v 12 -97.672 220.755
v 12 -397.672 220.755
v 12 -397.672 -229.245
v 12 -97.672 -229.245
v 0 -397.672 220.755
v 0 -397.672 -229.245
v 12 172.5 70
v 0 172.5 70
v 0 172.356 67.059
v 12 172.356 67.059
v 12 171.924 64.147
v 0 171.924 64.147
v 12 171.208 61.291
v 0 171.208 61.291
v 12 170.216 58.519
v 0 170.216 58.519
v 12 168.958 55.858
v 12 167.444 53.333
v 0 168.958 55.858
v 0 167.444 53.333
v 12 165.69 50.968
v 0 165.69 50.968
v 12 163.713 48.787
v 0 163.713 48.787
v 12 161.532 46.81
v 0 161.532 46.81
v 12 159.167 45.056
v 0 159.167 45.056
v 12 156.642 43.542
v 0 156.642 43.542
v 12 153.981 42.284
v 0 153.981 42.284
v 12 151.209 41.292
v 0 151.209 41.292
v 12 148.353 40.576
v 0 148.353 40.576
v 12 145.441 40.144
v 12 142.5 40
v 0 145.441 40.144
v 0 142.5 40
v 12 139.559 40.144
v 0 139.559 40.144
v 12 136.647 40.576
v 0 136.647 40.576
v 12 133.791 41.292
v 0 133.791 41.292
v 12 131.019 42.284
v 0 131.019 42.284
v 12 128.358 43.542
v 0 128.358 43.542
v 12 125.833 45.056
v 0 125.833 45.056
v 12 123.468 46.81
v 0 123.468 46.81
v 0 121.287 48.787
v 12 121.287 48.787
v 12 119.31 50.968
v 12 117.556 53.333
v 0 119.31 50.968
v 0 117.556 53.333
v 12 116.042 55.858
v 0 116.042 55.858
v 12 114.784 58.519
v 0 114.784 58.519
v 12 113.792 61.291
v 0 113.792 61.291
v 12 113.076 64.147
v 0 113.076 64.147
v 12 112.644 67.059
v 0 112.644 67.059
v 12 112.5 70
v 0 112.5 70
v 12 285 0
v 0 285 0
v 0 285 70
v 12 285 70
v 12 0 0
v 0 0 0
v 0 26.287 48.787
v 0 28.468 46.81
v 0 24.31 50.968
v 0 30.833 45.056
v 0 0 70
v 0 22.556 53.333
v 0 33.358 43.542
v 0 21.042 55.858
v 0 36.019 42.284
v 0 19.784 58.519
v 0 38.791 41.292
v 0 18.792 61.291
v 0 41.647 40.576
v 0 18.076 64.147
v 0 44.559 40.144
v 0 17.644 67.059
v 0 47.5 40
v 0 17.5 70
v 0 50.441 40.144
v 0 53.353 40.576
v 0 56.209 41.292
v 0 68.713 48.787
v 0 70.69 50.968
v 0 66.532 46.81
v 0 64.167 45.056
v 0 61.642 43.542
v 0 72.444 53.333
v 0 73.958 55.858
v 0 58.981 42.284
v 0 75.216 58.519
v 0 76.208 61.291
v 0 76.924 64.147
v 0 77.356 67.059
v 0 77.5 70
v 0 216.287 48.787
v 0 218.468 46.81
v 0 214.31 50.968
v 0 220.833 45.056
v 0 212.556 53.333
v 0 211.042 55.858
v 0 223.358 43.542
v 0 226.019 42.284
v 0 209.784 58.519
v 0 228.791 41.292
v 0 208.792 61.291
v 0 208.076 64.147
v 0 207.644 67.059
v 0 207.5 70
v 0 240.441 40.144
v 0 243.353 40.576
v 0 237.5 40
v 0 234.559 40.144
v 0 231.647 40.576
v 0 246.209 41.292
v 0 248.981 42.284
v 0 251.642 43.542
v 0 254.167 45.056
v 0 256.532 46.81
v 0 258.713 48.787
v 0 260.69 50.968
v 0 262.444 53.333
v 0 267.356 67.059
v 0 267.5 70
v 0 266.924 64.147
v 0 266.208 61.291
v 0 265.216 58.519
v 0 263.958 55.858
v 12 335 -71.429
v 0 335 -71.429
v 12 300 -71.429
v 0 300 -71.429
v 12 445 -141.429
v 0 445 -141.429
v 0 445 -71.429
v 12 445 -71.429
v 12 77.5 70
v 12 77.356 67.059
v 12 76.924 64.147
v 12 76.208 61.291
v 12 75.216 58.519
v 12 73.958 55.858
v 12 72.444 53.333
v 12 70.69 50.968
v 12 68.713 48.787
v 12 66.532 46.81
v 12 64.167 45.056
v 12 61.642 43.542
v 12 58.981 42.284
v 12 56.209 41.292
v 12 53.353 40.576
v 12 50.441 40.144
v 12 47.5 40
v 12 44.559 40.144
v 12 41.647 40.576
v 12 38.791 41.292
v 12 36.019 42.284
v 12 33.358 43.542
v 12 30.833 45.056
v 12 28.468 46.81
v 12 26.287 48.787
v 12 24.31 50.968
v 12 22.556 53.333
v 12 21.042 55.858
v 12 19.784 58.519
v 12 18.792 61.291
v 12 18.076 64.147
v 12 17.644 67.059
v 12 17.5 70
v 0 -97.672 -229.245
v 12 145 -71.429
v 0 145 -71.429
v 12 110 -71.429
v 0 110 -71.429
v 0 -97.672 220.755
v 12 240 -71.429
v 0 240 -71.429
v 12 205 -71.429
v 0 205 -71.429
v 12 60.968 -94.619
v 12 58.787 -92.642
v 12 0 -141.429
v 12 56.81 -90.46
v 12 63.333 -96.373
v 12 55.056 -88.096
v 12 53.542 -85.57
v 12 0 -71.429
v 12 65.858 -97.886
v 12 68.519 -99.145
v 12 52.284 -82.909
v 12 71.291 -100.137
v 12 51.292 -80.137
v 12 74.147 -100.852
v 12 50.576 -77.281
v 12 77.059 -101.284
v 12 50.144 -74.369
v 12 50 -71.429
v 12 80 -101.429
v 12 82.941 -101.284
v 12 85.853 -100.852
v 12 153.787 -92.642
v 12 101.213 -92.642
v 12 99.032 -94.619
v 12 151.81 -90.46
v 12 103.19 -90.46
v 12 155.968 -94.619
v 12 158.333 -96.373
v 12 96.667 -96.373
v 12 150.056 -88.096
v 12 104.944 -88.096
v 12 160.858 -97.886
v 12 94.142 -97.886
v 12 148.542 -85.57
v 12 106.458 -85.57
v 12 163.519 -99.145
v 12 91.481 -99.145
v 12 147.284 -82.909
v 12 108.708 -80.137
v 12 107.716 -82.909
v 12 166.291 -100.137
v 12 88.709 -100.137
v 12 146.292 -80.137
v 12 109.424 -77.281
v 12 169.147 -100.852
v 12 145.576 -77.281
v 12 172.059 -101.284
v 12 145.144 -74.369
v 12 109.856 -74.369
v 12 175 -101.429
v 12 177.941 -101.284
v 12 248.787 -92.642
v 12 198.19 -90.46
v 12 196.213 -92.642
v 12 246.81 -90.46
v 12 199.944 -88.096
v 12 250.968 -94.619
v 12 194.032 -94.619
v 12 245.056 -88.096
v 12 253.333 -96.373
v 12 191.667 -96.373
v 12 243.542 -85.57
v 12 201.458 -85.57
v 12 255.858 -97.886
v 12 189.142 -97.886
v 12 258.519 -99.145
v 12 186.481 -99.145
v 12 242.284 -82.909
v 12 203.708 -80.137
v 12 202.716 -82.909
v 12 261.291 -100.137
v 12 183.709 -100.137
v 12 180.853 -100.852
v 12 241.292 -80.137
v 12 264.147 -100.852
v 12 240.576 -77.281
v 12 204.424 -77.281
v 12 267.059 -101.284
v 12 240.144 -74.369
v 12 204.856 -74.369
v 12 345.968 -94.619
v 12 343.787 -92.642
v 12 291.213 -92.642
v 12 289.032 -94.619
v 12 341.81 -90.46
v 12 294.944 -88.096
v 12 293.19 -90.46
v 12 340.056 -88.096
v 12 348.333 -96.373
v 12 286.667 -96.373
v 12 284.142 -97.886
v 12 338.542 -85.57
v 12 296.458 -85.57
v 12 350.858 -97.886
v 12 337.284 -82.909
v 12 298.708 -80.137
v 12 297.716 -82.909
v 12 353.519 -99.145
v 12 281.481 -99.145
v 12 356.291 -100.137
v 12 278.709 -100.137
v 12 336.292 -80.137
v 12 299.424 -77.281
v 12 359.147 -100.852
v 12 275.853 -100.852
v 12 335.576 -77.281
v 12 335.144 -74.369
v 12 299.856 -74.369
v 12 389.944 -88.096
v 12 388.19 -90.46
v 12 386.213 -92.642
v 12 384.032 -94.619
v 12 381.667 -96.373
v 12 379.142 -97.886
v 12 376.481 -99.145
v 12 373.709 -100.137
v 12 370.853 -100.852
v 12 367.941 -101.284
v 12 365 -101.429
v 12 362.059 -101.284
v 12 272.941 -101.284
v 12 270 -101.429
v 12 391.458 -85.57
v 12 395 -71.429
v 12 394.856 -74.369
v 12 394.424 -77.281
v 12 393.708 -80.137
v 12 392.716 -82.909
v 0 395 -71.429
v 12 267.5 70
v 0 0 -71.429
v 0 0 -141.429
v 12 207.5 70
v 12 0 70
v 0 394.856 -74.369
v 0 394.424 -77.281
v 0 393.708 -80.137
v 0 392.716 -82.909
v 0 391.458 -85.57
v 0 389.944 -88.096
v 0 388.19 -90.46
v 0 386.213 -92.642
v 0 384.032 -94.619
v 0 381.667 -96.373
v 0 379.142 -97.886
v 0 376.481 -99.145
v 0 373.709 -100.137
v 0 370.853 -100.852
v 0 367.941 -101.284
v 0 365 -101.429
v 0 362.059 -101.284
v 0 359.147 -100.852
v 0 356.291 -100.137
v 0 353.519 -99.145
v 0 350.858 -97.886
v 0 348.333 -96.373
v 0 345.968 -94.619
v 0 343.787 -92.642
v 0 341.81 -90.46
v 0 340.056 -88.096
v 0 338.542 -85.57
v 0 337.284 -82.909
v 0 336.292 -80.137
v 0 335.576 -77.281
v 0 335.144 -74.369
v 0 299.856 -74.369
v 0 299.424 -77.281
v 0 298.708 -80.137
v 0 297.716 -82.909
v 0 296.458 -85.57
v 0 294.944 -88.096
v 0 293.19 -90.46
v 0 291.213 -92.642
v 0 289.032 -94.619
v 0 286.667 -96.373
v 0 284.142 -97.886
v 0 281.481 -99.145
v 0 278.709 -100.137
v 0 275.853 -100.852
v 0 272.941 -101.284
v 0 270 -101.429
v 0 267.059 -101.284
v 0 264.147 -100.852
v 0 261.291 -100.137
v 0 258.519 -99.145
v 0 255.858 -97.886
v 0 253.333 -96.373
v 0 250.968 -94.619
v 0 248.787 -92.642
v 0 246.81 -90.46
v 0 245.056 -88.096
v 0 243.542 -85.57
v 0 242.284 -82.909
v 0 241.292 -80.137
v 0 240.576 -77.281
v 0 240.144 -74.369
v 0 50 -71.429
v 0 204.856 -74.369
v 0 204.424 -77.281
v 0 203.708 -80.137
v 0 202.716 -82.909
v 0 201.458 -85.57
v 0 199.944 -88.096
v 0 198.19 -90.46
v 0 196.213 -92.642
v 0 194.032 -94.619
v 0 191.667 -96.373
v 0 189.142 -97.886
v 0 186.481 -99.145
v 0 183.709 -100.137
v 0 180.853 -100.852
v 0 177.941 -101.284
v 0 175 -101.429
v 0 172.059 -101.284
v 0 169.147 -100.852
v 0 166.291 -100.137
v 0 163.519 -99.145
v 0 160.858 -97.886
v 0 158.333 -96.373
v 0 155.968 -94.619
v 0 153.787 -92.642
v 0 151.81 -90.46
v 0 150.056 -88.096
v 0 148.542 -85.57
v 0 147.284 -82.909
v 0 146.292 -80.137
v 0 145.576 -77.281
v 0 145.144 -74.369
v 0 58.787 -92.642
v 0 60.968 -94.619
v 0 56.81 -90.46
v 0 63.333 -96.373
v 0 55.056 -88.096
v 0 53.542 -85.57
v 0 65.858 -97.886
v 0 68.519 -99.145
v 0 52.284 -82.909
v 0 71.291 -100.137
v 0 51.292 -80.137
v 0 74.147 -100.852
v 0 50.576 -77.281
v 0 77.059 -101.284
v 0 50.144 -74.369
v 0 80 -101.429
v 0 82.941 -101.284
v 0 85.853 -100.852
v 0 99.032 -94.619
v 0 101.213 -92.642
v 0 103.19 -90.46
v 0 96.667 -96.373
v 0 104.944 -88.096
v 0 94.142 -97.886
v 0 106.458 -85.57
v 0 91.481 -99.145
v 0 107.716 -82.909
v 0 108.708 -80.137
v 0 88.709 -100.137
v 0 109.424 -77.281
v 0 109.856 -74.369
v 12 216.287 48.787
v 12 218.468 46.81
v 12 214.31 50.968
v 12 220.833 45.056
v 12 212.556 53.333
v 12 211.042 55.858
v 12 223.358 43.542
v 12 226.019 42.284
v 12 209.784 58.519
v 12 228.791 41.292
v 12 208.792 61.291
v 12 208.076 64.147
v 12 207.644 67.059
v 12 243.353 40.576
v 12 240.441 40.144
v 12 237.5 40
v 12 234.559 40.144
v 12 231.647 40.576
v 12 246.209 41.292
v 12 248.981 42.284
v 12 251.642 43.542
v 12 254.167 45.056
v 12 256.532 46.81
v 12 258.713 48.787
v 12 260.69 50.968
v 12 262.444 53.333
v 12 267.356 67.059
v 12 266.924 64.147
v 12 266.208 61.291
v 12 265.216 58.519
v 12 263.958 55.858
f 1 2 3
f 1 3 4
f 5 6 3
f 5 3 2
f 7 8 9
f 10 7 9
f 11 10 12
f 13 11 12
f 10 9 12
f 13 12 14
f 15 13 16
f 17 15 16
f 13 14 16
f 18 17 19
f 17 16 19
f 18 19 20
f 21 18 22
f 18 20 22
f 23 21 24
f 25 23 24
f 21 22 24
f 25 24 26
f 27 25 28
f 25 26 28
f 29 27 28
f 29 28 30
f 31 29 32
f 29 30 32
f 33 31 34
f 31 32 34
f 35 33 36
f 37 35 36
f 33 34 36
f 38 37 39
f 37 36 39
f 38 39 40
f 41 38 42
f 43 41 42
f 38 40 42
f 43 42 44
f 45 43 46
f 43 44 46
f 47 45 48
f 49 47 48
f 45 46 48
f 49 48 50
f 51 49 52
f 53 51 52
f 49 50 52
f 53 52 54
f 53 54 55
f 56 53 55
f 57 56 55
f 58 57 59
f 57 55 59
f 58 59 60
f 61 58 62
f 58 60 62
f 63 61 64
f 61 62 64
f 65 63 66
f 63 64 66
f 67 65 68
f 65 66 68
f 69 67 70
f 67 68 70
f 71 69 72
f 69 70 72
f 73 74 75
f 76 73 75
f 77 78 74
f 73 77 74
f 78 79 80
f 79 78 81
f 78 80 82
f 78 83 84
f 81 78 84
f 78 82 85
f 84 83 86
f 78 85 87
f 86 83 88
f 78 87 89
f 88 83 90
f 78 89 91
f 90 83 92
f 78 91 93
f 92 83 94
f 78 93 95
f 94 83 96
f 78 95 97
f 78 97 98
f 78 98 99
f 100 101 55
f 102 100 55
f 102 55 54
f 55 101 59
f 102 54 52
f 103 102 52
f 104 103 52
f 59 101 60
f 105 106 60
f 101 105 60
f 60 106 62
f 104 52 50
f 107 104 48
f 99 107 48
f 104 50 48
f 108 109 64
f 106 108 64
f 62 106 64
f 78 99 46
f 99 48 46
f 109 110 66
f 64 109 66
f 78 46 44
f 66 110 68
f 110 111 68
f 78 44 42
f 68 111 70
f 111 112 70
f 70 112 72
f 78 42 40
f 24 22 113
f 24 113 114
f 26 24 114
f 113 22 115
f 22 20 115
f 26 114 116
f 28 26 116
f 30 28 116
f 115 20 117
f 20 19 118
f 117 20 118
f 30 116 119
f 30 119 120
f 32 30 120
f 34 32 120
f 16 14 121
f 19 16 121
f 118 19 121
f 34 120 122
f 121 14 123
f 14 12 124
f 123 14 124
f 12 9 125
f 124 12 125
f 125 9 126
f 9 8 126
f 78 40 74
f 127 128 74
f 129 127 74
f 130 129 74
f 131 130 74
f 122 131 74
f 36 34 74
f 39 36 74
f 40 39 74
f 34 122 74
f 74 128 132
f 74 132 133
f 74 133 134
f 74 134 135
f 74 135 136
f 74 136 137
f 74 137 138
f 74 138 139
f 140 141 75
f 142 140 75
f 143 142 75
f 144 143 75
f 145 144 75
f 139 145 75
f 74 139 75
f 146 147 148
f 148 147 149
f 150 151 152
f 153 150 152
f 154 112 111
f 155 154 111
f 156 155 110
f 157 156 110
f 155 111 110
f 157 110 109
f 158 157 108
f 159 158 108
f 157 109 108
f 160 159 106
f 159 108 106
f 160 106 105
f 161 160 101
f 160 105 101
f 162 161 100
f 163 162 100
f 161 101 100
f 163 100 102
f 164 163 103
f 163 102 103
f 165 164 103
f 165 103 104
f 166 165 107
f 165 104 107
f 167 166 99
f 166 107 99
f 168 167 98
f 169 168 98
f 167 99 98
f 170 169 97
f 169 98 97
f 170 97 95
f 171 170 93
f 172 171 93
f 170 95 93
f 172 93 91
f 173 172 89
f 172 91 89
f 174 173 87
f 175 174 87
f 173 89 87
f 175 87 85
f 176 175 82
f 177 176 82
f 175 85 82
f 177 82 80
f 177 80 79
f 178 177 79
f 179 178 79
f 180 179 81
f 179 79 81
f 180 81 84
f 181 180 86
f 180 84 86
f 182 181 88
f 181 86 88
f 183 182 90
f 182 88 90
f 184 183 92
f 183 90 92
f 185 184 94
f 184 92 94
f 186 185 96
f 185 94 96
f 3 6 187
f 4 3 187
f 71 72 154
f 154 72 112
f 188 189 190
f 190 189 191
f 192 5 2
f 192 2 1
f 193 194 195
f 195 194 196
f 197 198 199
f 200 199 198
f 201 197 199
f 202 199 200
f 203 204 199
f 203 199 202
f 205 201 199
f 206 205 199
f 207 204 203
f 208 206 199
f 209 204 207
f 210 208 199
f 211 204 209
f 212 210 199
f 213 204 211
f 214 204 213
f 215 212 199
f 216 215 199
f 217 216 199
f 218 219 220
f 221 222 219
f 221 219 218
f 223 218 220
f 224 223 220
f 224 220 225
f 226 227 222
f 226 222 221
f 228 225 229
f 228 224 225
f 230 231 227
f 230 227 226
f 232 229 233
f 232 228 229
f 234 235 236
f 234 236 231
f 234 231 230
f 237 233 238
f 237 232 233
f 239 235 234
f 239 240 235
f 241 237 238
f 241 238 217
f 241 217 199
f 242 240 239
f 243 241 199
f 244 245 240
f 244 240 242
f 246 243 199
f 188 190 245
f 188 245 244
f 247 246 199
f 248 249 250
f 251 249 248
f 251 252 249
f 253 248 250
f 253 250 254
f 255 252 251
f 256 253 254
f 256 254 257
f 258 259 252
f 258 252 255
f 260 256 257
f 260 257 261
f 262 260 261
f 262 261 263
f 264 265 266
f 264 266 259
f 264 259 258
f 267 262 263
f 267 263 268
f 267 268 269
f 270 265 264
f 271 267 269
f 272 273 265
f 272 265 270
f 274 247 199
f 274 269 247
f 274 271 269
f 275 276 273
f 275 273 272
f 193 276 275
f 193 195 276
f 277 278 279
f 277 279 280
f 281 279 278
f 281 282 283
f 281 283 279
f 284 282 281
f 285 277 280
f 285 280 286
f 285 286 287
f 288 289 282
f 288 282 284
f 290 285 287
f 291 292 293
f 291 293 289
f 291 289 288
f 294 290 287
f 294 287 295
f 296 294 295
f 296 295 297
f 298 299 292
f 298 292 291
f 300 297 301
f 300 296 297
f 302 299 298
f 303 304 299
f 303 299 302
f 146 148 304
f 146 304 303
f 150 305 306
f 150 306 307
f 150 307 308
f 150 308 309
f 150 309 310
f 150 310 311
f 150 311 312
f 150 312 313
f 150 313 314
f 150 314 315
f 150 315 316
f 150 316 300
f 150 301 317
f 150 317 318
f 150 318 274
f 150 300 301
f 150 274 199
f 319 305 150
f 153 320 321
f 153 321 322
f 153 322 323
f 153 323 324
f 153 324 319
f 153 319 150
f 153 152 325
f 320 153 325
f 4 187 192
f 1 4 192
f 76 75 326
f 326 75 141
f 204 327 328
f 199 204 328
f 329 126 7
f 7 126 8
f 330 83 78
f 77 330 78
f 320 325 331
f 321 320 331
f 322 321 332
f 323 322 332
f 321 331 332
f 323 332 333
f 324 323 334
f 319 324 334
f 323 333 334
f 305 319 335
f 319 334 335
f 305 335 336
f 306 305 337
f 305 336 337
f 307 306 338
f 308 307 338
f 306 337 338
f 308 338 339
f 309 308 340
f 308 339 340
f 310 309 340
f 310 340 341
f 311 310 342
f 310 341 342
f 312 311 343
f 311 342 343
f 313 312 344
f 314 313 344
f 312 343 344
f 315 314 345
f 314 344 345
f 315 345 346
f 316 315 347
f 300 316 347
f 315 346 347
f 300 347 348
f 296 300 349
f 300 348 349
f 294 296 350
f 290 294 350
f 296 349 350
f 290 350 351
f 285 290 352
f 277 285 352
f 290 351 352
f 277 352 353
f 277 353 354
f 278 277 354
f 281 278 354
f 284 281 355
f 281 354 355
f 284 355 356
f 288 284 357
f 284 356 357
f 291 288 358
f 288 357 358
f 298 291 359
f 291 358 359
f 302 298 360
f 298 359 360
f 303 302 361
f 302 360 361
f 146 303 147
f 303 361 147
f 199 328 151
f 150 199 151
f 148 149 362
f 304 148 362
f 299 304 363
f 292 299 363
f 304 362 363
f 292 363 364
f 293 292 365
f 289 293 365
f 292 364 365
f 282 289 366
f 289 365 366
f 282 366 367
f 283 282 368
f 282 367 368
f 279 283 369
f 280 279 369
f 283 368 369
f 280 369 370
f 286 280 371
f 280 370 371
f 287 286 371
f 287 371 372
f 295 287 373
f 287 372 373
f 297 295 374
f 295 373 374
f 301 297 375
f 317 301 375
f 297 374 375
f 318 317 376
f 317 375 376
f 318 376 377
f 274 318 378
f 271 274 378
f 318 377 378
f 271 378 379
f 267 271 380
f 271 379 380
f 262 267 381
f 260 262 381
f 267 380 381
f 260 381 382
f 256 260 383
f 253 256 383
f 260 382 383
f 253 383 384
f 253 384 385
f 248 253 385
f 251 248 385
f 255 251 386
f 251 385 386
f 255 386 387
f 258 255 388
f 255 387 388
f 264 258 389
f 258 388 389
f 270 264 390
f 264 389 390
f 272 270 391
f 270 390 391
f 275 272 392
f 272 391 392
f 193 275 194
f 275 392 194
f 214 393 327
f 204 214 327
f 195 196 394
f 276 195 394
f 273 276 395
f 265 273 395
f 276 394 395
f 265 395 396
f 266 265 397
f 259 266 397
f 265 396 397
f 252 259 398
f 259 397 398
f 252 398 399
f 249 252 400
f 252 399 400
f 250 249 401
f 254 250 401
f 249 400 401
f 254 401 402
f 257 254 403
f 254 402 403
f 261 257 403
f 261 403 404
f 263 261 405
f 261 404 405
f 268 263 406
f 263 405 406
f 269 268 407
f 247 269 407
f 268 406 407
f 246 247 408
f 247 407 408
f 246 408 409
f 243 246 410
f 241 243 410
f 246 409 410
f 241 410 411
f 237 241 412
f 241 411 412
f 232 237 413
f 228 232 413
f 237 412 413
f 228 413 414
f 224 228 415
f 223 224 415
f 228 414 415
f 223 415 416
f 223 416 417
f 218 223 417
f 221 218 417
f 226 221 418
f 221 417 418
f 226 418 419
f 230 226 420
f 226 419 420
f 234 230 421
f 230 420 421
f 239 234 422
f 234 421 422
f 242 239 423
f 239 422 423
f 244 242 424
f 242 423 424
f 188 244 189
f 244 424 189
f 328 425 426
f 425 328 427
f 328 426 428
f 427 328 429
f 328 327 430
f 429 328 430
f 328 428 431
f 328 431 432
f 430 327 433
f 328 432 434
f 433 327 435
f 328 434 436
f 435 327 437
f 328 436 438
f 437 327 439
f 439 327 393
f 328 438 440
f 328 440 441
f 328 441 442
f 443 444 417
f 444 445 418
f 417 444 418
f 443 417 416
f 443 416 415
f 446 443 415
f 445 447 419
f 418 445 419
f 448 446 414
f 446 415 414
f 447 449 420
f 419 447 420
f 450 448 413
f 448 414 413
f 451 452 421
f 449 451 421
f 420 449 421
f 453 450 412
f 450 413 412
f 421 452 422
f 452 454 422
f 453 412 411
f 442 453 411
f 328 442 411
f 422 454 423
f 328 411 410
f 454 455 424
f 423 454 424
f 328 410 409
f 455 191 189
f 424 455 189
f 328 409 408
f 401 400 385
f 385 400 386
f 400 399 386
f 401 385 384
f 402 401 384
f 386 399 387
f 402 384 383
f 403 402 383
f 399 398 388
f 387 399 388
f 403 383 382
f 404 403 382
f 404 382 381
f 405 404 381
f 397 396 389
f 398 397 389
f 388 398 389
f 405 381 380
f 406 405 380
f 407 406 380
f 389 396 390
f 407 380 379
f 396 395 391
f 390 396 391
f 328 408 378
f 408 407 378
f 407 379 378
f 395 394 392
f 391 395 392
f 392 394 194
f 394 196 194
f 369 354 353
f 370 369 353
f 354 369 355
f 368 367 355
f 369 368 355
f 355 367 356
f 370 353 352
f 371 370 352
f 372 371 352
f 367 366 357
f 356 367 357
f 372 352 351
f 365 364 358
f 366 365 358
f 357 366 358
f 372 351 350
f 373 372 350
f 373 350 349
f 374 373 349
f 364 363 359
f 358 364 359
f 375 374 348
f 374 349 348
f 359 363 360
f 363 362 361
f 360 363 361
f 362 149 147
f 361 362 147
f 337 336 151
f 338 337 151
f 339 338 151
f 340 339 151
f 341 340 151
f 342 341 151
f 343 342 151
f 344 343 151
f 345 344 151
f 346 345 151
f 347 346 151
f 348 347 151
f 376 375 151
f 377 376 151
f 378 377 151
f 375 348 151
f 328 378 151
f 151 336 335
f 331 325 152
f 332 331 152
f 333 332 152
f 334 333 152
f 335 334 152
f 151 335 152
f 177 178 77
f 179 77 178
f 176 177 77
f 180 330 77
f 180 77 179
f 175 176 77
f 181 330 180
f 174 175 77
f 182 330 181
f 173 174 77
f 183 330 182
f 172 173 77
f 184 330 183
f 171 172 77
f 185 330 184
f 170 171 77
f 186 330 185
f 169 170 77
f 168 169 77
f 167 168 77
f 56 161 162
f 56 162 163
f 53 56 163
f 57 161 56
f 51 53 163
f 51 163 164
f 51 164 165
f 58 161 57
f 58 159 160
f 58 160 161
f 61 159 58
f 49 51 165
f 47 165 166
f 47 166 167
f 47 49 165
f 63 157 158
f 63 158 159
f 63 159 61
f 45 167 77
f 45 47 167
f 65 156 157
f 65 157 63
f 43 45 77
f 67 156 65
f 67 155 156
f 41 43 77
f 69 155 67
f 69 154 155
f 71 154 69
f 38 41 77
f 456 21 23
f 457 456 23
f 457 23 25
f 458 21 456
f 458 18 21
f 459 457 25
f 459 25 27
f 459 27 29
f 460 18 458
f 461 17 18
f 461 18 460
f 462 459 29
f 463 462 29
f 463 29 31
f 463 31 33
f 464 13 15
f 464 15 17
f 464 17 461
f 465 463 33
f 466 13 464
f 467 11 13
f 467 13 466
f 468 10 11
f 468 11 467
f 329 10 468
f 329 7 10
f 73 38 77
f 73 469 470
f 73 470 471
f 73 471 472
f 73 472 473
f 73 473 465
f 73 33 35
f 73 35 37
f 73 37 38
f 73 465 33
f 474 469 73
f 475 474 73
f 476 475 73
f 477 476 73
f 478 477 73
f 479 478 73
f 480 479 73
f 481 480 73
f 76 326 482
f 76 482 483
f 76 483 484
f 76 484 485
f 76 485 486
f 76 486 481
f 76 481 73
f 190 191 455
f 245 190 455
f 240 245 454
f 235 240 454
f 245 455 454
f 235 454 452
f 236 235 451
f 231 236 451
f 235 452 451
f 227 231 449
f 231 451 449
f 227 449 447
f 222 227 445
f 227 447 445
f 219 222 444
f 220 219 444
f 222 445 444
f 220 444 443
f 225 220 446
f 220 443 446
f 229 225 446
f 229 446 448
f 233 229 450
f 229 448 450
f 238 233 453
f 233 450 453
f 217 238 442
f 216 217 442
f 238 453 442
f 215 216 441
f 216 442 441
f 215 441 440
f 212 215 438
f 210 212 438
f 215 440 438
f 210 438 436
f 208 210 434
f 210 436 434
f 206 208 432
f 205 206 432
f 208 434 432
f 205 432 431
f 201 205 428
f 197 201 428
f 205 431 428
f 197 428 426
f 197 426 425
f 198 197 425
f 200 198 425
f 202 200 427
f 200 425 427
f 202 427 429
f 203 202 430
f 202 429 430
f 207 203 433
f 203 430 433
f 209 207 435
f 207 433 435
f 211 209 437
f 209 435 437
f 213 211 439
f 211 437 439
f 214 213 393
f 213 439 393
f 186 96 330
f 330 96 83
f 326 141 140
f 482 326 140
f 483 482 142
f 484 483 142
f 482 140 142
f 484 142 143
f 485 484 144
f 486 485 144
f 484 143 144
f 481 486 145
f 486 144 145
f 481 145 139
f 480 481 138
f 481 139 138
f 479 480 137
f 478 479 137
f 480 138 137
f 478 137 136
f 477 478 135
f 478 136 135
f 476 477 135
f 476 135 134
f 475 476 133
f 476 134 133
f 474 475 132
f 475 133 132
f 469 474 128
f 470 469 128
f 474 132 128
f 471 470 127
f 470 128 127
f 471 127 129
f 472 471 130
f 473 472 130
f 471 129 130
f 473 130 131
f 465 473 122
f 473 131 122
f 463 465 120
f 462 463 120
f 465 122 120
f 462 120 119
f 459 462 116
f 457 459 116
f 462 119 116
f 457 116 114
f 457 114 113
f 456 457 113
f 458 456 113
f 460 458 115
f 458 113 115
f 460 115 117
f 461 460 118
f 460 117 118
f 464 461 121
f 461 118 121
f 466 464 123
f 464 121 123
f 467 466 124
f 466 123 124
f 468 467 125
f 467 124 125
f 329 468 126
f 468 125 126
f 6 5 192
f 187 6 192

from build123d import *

# Parameters (mm, degrees)
F1_DEPTH = 12
F3_DEPTH = 12
F4_W     = 300
F4_H     = 450
F5_DEPTH = 12


with BuildPart() as f1:
    # F0 (on Right) → F1 (new body)
    with BuildSketch(Plane.YZ):
        with BuildLine():
            Line((0, 70), (0, 0))
            Line((0, 0), (285, 0))
            Line((285, 0), (285, 70))
            Line((285, 70), (267.5, 70))
            ThreePointArc((267.5, 70), (237.5, 40), (207.5, 70))
            Line((207.5, 70), (172.5, 70))
            ThreePointArc((172.5, 70), (142.5, 40), (112.5, 70))
            Line((112.5, 70), (77.5, 70))
            ThreePointArc((77.5, 70), (47.5, 40), (17.5, 70))
            Line((17.5, 70), (0, 70))
        make_face()
    extrude(amount=F1_DEPTH)


with BuildPart() as f3:
    # F2 (on Right) → F3 (new body)
    with BuildSketch(Plane.YZ):
        with BuildLine():
            Line((50, -71.42857), (0, -71.42857))
            Line((0, -71.42857), (0, -141.42857))
            Line((0, -141.42857), (445, -141.42857))
            Line((445, -141.42857), (445, -71.42857))
            Line((445, -71.42857), (395, -71.42857))
            ThreePointArc((395, -71.42857), (365, -101.42857), (335, -71.42857))
            Line((335, -71.42857), (300, -71.42857))
            ThreePointArc((300, -71.42857), (270, -101.42857), (240, -71.42857))
            Line((240, -71.42857), (205, -71.42857))
            ThreePointArc((205, -71.42857), (175, -101.42857), (145, -71.42857))
            Line((145, -71.42857), (110, -71.42857))
            ThreePointArc((110, -71.42857), (80, -101.42857), (50, -71.42857))
        make_face()
    extrude(amount=F3_DEPTH)


with BuildPart() as f5:
    # F4 (on Right) → F5 (new body)
    with BuildSketch(Plane.YZ):
        with Locations((-247.672111, -4.244946)):
            Rectangle(F4_W, F4_H)
    extrude(amount=F5_DEPTH)


solid = Compound([f1.part, f3.part, f5.part])
